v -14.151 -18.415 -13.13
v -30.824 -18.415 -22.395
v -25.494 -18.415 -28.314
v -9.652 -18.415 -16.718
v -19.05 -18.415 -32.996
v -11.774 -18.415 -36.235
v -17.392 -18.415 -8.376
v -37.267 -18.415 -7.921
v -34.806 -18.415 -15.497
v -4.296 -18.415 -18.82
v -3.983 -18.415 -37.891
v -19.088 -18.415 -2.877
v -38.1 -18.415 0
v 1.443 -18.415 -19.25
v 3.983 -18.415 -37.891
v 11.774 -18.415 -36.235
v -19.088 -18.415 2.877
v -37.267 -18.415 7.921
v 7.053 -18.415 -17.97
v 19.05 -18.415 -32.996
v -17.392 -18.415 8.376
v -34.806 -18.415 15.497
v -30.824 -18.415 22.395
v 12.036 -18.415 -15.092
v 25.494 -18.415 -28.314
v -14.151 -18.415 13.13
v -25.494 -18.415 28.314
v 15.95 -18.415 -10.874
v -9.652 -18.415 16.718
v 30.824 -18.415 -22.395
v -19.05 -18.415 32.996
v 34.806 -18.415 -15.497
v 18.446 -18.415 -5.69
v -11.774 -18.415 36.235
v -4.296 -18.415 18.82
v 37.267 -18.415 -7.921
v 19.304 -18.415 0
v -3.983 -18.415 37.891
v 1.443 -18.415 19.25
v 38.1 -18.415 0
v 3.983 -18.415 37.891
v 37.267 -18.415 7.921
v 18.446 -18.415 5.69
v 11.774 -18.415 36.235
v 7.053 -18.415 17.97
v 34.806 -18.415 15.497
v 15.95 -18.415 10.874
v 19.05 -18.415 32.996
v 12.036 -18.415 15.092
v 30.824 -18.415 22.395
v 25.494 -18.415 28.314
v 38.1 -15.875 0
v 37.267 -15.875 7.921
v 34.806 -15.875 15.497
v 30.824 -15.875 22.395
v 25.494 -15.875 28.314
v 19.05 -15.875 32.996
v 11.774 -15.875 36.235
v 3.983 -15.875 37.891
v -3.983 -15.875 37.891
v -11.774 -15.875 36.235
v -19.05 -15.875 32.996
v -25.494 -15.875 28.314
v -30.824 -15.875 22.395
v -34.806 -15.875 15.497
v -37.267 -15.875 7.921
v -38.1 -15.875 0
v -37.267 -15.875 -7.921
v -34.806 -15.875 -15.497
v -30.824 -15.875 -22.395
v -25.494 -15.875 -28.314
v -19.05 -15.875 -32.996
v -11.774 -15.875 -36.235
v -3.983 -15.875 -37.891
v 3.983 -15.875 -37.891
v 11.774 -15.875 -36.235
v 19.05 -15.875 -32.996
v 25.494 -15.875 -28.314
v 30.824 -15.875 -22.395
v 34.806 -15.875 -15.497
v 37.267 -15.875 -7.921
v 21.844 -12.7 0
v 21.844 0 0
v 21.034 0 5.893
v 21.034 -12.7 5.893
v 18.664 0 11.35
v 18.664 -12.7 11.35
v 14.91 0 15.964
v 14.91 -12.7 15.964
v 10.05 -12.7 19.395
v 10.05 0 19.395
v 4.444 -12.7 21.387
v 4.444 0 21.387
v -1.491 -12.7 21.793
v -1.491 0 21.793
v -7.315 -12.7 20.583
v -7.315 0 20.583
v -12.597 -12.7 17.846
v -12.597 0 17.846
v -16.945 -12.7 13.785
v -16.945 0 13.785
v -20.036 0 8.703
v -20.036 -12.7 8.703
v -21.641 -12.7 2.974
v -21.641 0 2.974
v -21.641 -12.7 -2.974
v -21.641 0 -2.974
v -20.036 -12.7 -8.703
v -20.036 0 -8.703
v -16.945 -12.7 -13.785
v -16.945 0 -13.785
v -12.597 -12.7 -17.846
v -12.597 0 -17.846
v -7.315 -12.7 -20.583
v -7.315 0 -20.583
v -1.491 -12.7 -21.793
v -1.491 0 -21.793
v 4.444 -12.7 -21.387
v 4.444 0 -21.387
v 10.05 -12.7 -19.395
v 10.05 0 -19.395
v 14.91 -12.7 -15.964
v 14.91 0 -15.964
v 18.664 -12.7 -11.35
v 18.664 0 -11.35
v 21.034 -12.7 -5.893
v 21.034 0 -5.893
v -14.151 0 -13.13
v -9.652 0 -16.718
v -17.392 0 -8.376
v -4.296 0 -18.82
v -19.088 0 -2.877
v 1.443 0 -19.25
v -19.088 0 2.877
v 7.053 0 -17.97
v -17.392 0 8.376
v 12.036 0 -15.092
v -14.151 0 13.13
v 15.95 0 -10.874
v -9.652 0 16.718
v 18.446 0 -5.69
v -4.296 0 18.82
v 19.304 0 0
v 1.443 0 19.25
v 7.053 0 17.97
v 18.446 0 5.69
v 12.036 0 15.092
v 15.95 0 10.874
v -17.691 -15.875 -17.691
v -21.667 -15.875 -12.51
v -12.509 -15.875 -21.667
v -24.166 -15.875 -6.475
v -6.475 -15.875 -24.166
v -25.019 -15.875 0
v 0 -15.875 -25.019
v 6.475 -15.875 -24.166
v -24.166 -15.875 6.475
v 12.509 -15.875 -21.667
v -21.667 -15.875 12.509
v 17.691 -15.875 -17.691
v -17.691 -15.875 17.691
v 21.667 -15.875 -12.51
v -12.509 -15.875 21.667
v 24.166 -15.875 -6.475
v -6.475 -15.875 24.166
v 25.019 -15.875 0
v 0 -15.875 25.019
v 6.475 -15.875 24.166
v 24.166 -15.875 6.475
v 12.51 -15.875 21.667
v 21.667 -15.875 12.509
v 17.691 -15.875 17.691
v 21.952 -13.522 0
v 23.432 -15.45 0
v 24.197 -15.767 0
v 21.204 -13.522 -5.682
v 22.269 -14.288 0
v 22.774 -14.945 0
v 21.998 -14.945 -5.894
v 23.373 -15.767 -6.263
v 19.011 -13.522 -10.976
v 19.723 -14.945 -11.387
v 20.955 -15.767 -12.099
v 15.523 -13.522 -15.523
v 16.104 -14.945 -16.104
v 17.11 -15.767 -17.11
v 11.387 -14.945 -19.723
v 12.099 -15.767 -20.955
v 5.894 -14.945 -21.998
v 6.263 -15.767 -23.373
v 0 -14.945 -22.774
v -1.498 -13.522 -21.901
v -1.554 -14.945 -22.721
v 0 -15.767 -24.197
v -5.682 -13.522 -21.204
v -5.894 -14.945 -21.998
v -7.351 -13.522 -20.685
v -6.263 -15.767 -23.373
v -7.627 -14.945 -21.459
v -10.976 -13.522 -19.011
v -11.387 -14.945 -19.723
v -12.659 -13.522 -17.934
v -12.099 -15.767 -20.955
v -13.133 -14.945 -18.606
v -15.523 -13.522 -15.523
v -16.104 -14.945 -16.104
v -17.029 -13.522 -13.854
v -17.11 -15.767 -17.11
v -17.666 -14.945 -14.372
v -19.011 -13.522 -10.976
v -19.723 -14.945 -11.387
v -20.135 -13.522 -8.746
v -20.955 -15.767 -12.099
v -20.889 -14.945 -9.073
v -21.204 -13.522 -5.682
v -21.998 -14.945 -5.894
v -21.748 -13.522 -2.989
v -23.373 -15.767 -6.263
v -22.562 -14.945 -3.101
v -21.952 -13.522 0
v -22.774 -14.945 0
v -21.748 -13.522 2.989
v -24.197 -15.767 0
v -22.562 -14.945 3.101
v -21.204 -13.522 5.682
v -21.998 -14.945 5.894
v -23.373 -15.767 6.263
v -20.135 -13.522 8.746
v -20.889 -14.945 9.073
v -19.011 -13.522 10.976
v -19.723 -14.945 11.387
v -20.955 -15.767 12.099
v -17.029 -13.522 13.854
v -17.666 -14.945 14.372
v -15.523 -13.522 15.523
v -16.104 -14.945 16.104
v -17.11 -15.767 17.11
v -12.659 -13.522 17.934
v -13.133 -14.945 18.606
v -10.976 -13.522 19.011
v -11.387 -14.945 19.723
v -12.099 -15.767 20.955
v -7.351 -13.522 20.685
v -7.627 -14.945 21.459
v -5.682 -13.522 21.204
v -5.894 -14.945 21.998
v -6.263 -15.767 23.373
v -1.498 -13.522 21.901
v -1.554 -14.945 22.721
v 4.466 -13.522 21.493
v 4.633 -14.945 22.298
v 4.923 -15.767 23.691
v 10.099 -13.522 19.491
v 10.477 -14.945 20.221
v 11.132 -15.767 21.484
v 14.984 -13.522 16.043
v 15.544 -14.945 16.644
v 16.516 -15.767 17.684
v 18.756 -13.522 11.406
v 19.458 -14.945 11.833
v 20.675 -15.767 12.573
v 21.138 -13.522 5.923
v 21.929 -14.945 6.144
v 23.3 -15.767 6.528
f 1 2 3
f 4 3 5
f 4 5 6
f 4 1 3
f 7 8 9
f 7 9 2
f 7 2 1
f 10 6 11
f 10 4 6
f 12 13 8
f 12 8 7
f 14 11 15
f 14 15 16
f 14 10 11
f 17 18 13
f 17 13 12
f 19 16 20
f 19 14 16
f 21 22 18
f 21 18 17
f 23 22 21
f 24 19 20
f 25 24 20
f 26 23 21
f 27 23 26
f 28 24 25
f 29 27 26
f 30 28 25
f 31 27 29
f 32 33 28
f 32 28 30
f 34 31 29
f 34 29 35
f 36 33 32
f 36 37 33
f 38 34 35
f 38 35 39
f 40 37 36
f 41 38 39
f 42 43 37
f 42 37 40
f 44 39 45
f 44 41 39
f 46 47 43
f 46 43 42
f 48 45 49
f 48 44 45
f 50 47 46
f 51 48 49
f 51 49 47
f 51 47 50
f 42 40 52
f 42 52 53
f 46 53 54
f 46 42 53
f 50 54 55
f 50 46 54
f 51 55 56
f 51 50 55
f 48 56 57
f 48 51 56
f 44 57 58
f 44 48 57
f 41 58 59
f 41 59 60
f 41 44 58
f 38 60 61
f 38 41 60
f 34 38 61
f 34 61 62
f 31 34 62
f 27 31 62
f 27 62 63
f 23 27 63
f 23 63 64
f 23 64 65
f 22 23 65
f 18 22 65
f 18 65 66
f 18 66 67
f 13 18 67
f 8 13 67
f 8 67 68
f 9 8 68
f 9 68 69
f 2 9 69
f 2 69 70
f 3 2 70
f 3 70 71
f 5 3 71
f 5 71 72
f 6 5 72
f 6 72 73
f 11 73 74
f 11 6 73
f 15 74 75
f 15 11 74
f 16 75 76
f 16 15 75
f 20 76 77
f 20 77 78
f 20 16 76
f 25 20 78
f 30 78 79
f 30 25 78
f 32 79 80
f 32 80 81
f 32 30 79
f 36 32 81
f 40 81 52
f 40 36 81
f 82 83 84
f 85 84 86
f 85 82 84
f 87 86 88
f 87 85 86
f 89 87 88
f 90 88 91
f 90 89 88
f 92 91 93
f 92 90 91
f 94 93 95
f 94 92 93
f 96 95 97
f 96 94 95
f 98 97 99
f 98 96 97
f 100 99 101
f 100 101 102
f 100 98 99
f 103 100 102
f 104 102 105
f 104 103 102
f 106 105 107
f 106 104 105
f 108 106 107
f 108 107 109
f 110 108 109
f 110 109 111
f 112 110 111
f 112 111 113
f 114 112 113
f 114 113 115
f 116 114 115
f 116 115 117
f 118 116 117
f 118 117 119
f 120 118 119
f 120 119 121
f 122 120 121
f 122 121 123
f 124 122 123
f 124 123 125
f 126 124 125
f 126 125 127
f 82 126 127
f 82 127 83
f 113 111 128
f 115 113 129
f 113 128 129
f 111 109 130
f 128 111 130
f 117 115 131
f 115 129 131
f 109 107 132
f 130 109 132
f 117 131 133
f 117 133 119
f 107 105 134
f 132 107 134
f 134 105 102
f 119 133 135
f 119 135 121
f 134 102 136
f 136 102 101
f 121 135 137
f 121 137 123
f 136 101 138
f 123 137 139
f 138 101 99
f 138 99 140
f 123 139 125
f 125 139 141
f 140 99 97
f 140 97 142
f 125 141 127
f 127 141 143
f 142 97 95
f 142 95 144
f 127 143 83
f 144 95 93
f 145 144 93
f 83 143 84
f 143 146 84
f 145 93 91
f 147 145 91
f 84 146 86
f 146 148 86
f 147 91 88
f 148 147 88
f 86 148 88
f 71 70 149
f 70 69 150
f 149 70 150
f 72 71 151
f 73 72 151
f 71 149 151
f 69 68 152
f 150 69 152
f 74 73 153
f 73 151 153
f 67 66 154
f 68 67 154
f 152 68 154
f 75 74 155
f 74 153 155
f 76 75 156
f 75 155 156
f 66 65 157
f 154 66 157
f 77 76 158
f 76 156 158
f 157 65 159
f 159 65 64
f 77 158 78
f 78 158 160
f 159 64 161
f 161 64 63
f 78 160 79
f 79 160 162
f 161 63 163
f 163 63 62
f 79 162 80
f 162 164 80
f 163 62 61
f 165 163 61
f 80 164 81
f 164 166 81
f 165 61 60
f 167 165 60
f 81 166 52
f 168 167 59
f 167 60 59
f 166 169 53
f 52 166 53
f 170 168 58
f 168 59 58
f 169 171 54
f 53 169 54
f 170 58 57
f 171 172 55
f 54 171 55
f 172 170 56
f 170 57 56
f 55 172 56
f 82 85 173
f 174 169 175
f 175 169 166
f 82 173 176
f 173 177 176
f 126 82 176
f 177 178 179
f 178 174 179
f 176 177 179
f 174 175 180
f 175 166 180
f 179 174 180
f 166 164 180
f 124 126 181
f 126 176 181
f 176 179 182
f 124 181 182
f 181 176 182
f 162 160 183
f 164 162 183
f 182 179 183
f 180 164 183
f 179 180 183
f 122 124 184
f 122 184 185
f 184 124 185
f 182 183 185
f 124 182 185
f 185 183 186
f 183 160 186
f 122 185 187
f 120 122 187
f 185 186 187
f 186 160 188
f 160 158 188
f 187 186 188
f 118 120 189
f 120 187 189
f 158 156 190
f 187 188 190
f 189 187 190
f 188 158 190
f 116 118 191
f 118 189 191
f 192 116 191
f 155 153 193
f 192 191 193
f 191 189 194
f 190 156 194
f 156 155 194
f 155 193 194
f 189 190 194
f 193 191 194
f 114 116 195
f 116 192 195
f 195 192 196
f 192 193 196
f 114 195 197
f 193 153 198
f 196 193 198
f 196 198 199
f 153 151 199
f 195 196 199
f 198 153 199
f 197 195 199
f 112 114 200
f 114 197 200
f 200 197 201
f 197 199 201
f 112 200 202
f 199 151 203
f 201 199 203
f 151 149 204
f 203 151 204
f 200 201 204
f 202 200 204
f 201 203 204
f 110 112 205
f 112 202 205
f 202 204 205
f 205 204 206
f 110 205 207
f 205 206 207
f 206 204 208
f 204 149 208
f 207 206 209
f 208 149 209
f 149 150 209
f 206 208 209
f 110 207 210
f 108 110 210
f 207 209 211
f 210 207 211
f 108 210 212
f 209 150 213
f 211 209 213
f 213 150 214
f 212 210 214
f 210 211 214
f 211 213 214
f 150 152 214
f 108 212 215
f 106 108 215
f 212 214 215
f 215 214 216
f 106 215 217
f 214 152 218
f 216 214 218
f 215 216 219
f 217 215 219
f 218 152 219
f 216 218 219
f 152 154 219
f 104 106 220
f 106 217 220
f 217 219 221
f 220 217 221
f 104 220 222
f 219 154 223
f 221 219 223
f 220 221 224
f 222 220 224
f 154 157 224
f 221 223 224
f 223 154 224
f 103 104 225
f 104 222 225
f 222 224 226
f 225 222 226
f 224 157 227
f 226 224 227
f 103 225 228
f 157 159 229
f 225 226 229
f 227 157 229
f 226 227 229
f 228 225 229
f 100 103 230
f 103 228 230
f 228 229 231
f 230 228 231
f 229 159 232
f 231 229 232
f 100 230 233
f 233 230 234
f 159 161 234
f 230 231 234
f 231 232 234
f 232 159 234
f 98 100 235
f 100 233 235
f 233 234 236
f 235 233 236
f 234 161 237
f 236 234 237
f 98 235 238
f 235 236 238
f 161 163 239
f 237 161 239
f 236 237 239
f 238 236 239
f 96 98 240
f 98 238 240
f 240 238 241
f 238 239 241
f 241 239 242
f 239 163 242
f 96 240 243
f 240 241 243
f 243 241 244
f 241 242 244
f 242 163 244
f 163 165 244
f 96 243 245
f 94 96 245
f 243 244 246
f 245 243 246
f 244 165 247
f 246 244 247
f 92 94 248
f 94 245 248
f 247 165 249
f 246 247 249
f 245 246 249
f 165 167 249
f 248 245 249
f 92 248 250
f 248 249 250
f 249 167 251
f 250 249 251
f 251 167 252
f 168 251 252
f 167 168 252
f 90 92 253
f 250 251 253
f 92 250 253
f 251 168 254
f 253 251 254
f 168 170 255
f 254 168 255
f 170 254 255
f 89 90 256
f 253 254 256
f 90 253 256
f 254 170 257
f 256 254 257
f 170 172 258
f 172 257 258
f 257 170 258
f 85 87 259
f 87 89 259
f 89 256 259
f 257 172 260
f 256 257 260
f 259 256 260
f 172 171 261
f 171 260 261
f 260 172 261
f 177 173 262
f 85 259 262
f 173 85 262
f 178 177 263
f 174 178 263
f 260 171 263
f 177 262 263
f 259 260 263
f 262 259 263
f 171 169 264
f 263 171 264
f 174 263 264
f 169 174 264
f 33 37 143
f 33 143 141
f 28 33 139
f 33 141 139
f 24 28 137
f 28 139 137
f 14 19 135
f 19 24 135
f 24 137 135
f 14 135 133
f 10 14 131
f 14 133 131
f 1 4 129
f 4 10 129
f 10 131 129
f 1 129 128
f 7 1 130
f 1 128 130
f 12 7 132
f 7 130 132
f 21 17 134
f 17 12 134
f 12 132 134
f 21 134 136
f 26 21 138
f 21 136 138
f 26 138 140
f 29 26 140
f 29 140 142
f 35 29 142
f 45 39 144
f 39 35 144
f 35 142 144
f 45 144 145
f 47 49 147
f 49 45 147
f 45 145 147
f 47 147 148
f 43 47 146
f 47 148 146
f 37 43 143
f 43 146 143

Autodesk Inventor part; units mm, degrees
ref_plane "YZ Plane" through (0, 0, 0) normal (1, 0, 0) x (0, 1, 0)
ref_plane "XZ Plane" through (0, 0, 0) normal (0, 1, 0) x (-1, 0, 0)
ref_plane "XY Plane" through (0, 0, 0) normal (0, 0, 1) x (1, 0, 0)
sketch "Sketch1" plane through (0, 0, 0) normal (0, 0, 1) x (1, 0, 0)
  line L0 (21.844, 0) -> (21.844, -12.7)
  line L1 (25.019, -15.875) -> (38.1, -15.875)
  line L2 (38.1, -15.875) -> (38.1, -18.415)
  line L3 (38.1, -18.415) -> (19.304, -18.415)
  line L4 (19.304, -18.415) -> (19.304, 0)
  line L5 (19.304, 0) -> (21.844, 0)
  line L6 (0, 0) -> (27.9096, 0) construction
  arc A0 (21.844, -12.7) -> (25.019, -15.875) centre (25.019, -12.7) ccw
  line L7 (0, 0) -> (0, -18.415) construction
  dimension "d0" = 19.304
  dimension "d1" = 18.415
  dimension "d2" = 2.54
  dimension "d3" = 2.54
  dimension "d5" = 3.175
  dimension "d9" = 38.1
revolve "Revolution1" add sketch "Sketch1" angle 360 about axis through (0, 0, 0) along (0, -1, 0)
sketch "Sketch2" plane through (0, 0, 0) normal (1, 0, 0) x (0, 1, 0)
  line L0 (0, 0) -> (-26.67, 0) construction
  line L1 (-13.97, -6.35) -> (0, -6.35)
  line L2 (0, -6.35) -> (0, 6.35)
  line L3 (0, 6.35) -> (-13.97, 6.35)
  line L4 (-13.97, 6.35) -> (-13.97, -6.35)
  line L5 (-13.97, -6.35) -> (0, 6.35) construction
  line L6 (0, -6.35) -> (-13.97, 6.35) construction
  line L7 (0, 19.304) -> (0, -19.304) projected
  point P0 (-6.985, 0)
  dimension "d10" = 12.7
  dimension "d11" = 13.97
  dimension "d12" = 0
properties part number "customWasherTmp"
